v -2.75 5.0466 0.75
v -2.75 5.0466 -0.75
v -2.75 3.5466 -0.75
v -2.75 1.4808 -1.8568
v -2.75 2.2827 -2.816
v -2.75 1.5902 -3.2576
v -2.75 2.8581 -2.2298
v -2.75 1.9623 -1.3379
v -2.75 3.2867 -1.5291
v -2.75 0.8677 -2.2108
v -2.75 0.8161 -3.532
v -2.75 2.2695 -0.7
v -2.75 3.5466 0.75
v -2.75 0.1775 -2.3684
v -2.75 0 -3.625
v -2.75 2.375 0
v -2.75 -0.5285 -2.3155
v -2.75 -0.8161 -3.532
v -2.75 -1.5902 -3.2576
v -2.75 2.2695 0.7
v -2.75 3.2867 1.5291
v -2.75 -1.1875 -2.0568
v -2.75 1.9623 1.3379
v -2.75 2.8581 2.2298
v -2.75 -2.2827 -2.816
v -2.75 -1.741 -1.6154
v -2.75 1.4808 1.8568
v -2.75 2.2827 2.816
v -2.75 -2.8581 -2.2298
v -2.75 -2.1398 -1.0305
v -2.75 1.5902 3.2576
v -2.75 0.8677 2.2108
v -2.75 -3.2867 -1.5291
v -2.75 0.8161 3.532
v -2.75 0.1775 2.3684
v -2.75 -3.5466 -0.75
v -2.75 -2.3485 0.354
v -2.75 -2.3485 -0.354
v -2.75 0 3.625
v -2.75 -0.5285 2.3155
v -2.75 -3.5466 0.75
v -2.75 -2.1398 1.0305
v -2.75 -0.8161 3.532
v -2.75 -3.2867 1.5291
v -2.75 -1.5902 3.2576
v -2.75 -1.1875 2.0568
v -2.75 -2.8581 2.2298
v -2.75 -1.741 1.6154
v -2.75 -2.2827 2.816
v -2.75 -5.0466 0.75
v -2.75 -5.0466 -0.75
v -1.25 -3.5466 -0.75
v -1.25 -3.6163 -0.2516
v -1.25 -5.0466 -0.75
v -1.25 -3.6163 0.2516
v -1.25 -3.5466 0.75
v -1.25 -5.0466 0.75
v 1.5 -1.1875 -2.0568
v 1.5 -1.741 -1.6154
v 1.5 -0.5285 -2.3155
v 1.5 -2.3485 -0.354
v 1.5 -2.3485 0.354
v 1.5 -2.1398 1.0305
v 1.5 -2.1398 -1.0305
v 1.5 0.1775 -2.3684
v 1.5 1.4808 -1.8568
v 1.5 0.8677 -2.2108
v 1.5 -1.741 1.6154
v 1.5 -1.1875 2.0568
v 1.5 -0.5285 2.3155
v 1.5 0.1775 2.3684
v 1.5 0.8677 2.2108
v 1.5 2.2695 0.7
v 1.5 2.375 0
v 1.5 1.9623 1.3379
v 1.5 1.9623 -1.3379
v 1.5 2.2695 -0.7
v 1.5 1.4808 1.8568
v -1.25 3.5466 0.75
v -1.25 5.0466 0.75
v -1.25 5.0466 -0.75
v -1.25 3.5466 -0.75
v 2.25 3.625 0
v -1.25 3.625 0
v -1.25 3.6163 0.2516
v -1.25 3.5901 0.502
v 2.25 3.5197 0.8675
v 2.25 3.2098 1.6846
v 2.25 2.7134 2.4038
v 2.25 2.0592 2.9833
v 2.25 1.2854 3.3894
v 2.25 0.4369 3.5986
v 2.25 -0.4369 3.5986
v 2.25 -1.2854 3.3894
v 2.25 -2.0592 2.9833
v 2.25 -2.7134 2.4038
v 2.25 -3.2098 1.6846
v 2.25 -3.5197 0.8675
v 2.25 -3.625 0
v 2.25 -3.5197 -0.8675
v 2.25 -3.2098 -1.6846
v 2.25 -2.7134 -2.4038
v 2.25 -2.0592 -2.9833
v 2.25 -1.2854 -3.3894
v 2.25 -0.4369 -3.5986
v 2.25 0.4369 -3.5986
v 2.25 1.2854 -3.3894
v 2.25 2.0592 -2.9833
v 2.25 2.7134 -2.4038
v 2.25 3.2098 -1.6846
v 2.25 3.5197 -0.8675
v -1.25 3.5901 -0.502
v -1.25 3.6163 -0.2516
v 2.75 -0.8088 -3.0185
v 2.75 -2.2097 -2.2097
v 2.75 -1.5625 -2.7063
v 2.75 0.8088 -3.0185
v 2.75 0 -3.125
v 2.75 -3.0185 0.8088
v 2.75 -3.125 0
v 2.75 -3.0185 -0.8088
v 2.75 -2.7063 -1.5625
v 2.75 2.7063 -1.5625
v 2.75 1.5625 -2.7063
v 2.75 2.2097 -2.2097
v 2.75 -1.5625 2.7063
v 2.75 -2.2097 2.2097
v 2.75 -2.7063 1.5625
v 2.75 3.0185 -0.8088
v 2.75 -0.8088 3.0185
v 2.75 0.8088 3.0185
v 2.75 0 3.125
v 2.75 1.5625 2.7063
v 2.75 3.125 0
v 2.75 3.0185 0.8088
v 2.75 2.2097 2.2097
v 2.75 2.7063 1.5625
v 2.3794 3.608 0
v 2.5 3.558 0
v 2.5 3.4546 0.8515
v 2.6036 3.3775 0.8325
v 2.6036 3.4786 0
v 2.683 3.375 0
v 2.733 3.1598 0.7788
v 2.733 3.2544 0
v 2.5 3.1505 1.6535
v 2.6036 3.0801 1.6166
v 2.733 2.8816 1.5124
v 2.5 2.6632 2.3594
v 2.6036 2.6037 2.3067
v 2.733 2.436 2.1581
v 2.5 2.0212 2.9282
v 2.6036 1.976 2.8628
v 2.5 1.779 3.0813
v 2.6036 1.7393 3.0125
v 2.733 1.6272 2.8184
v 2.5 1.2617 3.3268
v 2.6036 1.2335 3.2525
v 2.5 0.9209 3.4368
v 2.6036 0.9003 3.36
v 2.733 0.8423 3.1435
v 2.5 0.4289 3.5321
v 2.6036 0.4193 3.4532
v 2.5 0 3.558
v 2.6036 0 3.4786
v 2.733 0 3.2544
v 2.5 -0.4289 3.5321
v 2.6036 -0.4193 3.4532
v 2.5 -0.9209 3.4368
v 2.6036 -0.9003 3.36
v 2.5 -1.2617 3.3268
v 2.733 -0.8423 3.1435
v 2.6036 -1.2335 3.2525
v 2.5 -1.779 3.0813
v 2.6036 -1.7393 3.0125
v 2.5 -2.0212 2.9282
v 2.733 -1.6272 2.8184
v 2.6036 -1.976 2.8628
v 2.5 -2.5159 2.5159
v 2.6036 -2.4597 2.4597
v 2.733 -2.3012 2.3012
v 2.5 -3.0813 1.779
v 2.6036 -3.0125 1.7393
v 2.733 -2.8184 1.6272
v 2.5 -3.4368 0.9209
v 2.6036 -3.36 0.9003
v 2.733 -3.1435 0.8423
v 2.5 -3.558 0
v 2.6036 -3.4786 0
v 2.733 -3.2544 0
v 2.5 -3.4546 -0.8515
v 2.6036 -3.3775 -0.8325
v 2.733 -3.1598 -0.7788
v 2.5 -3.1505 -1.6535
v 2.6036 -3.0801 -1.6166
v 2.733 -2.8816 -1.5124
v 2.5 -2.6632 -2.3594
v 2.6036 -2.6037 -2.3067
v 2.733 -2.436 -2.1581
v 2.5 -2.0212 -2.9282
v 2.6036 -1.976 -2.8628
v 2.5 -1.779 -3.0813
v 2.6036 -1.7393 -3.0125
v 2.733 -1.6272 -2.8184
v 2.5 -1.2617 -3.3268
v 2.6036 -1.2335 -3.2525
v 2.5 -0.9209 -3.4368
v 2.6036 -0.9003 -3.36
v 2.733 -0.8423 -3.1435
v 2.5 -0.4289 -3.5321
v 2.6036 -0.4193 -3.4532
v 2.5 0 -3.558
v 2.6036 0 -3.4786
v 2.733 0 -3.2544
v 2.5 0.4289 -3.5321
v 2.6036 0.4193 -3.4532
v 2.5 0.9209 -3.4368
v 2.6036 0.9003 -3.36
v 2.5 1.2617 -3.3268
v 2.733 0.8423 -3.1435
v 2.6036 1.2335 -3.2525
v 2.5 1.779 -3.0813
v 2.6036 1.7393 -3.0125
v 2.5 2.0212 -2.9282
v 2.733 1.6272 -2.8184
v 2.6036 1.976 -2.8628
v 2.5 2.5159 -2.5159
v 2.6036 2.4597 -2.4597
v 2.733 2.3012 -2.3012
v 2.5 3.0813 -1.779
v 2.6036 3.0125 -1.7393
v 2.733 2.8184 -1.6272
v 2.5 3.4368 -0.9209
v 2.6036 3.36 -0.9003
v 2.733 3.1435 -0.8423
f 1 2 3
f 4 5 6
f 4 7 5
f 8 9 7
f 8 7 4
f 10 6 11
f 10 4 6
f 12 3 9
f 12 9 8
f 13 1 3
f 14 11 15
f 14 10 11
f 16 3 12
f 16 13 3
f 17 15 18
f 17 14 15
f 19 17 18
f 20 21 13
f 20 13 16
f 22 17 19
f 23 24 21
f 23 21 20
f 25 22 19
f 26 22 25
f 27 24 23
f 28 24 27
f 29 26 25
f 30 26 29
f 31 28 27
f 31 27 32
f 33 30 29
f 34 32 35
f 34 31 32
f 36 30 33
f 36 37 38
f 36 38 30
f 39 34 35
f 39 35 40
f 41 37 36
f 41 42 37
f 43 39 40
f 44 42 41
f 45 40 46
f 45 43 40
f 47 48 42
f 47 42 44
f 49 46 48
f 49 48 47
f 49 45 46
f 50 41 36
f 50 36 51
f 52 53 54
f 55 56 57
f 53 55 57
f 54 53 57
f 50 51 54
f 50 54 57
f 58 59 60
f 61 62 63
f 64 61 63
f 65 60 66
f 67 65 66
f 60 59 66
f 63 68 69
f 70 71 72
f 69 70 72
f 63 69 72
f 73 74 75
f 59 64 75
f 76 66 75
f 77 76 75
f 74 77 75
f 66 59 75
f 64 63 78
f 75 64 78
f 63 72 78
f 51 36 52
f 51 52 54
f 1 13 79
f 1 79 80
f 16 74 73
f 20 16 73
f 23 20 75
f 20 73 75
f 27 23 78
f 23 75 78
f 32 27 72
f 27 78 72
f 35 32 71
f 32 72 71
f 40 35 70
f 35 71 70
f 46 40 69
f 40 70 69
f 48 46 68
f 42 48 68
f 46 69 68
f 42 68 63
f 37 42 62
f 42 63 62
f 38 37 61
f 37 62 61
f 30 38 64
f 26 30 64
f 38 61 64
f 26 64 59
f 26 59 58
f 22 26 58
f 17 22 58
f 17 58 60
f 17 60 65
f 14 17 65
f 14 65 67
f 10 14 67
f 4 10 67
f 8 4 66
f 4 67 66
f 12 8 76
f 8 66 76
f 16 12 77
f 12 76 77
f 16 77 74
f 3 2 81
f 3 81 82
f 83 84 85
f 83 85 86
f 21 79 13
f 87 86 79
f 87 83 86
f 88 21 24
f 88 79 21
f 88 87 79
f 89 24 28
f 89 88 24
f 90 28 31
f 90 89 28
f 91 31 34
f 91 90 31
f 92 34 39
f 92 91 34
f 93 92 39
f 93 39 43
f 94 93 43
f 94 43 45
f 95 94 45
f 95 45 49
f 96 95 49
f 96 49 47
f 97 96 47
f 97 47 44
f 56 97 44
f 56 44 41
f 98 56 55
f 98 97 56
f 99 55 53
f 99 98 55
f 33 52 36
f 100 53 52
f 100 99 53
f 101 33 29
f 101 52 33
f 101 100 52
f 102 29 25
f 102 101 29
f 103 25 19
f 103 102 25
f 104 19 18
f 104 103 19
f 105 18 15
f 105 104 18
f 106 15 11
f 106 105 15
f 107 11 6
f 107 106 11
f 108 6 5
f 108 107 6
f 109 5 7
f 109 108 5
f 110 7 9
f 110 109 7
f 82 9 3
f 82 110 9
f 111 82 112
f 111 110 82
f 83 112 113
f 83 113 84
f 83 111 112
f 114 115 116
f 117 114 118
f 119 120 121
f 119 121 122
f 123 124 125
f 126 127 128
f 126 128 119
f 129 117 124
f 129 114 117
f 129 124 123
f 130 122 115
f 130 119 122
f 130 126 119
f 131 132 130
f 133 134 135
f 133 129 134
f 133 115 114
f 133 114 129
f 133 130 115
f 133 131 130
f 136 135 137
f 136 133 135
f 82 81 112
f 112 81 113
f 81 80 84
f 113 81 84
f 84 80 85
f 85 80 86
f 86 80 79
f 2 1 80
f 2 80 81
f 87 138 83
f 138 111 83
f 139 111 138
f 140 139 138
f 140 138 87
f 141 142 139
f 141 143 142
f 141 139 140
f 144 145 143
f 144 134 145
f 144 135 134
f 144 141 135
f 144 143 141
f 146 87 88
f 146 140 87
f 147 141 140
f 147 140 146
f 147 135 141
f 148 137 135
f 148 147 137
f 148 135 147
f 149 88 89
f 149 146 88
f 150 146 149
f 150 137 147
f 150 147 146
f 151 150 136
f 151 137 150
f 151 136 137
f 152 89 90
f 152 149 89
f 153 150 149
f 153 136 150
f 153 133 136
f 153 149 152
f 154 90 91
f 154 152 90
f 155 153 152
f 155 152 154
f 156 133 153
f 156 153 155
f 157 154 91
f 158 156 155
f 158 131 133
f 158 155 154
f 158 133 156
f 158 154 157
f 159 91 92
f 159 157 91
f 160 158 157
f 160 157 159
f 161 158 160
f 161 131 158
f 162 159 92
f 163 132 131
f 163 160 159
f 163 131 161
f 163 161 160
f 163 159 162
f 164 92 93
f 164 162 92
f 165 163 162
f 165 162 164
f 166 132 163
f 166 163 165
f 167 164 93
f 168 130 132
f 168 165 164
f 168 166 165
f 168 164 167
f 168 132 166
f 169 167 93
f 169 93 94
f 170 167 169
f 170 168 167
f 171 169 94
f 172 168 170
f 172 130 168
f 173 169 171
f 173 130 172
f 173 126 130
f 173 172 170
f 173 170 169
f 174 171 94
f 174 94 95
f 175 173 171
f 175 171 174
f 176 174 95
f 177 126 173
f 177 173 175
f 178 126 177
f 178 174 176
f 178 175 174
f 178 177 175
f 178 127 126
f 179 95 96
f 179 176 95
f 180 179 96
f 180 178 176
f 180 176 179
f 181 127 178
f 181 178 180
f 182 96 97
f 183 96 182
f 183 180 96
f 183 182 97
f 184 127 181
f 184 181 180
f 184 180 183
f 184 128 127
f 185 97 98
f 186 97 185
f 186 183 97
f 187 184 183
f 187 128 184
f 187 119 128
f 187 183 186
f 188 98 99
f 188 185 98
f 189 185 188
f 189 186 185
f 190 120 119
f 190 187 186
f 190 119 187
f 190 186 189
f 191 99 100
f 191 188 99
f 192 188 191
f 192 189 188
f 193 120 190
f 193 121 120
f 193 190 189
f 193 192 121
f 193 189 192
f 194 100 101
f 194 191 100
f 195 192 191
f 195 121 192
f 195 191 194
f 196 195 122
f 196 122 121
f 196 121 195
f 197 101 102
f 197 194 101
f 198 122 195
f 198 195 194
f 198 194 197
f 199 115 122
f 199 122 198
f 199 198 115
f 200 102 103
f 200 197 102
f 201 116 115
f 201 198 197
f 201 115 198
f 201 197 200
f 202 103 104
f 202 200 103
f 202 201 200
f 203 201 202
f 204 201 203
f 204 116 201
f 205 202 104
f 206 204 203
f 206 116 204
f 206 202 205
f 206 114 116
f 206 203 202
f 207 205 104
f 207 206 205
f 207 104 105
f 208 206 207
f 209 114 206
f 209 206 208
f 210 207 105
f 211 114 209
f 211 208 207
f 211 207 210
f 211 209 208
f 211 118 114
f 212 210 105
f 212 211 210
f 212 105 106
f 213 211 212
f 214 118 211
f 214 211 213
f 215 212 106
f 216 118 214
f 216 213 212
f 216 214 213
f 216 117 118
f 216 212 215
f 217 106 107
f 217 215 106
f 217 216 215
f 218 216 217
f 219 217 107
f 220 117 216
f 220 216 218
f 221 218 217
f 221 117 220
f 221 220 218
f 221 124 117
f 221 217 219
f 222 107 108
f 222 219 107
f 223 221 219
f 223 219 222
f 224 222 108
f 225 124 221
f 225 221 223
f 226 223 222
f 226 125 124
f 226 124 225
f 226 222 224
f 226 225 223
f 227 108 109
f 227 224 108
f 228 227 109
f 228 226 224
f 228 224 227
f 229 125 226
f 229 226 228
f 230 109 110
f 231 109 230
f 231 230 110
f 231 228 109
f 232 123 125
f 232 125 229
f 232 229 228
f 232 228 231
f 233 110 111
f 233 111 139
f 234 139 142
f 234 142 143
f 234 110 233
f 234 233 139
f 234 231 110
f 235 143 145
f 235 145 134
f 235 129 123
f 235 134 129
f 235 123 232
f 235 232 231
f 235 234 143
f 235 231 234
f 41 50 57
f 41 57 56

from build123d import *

# Parameters (mm, degrees)
F0_R     = 3.625
F1_DEPTH = 2.75
F2_R     = 0.5
F3_T     = -1.25
F5_DEPTH = 1.5


with BuildPart() as f1:
    # F0 (on Right) → F1 (new body, symmetric)
    with BuildSketch(Plane.YZ):
        Circle(F0_R)
    extrude(amount=F1_DEPTH, both=True)

    # F2
    f2_edges = [f1.edges().sort_by_distance(p)[0] for p in [
        (2.75, -3.625, 0),
    ]]
    fillet(f2_edges, radius=F2_R)

    # F3
    f3_openings = [f1.faces().sort_by_distance(p)[0] for p in [
        (-2.75, 0, 0),
    ]]
    offset(amount=F3_T, openings=f3_openings)

    # F4 (on face) → F5 (join)
    with BuildSketch(Plane(origin=(-2.75, 0, 0), x_dir=(0, -1, 0), z_dir=(-1, 0, 0))):
        with BuildLine():
            Line((3.546565, -0.75), (5.046565, -0.75))
            Line((5.046565, -0.75), (5.046565, 0.75))
            Line((5.046565, 0.75), (3.546565, 0.75))
            ThreePointArc((3.546565, 0.75), (3.625, 0), (3.546565, -0.75))
        make_face()
        with BuildLine():
            Line((-3.546565, 0.75), (-5.046565, 0.75))
            Line((-5.046565, 0.75), (-5.046565, -0.75))
            Line((-5.046565, -0.75), (-3.546565, -0.75))
            ThreePointArc((-3.546565, -0.75), (-3.625, 0), (-3.546565, 0.75))
        make_face()
    extrude(amount=-F5_DEPTH)


solid = f1.part
